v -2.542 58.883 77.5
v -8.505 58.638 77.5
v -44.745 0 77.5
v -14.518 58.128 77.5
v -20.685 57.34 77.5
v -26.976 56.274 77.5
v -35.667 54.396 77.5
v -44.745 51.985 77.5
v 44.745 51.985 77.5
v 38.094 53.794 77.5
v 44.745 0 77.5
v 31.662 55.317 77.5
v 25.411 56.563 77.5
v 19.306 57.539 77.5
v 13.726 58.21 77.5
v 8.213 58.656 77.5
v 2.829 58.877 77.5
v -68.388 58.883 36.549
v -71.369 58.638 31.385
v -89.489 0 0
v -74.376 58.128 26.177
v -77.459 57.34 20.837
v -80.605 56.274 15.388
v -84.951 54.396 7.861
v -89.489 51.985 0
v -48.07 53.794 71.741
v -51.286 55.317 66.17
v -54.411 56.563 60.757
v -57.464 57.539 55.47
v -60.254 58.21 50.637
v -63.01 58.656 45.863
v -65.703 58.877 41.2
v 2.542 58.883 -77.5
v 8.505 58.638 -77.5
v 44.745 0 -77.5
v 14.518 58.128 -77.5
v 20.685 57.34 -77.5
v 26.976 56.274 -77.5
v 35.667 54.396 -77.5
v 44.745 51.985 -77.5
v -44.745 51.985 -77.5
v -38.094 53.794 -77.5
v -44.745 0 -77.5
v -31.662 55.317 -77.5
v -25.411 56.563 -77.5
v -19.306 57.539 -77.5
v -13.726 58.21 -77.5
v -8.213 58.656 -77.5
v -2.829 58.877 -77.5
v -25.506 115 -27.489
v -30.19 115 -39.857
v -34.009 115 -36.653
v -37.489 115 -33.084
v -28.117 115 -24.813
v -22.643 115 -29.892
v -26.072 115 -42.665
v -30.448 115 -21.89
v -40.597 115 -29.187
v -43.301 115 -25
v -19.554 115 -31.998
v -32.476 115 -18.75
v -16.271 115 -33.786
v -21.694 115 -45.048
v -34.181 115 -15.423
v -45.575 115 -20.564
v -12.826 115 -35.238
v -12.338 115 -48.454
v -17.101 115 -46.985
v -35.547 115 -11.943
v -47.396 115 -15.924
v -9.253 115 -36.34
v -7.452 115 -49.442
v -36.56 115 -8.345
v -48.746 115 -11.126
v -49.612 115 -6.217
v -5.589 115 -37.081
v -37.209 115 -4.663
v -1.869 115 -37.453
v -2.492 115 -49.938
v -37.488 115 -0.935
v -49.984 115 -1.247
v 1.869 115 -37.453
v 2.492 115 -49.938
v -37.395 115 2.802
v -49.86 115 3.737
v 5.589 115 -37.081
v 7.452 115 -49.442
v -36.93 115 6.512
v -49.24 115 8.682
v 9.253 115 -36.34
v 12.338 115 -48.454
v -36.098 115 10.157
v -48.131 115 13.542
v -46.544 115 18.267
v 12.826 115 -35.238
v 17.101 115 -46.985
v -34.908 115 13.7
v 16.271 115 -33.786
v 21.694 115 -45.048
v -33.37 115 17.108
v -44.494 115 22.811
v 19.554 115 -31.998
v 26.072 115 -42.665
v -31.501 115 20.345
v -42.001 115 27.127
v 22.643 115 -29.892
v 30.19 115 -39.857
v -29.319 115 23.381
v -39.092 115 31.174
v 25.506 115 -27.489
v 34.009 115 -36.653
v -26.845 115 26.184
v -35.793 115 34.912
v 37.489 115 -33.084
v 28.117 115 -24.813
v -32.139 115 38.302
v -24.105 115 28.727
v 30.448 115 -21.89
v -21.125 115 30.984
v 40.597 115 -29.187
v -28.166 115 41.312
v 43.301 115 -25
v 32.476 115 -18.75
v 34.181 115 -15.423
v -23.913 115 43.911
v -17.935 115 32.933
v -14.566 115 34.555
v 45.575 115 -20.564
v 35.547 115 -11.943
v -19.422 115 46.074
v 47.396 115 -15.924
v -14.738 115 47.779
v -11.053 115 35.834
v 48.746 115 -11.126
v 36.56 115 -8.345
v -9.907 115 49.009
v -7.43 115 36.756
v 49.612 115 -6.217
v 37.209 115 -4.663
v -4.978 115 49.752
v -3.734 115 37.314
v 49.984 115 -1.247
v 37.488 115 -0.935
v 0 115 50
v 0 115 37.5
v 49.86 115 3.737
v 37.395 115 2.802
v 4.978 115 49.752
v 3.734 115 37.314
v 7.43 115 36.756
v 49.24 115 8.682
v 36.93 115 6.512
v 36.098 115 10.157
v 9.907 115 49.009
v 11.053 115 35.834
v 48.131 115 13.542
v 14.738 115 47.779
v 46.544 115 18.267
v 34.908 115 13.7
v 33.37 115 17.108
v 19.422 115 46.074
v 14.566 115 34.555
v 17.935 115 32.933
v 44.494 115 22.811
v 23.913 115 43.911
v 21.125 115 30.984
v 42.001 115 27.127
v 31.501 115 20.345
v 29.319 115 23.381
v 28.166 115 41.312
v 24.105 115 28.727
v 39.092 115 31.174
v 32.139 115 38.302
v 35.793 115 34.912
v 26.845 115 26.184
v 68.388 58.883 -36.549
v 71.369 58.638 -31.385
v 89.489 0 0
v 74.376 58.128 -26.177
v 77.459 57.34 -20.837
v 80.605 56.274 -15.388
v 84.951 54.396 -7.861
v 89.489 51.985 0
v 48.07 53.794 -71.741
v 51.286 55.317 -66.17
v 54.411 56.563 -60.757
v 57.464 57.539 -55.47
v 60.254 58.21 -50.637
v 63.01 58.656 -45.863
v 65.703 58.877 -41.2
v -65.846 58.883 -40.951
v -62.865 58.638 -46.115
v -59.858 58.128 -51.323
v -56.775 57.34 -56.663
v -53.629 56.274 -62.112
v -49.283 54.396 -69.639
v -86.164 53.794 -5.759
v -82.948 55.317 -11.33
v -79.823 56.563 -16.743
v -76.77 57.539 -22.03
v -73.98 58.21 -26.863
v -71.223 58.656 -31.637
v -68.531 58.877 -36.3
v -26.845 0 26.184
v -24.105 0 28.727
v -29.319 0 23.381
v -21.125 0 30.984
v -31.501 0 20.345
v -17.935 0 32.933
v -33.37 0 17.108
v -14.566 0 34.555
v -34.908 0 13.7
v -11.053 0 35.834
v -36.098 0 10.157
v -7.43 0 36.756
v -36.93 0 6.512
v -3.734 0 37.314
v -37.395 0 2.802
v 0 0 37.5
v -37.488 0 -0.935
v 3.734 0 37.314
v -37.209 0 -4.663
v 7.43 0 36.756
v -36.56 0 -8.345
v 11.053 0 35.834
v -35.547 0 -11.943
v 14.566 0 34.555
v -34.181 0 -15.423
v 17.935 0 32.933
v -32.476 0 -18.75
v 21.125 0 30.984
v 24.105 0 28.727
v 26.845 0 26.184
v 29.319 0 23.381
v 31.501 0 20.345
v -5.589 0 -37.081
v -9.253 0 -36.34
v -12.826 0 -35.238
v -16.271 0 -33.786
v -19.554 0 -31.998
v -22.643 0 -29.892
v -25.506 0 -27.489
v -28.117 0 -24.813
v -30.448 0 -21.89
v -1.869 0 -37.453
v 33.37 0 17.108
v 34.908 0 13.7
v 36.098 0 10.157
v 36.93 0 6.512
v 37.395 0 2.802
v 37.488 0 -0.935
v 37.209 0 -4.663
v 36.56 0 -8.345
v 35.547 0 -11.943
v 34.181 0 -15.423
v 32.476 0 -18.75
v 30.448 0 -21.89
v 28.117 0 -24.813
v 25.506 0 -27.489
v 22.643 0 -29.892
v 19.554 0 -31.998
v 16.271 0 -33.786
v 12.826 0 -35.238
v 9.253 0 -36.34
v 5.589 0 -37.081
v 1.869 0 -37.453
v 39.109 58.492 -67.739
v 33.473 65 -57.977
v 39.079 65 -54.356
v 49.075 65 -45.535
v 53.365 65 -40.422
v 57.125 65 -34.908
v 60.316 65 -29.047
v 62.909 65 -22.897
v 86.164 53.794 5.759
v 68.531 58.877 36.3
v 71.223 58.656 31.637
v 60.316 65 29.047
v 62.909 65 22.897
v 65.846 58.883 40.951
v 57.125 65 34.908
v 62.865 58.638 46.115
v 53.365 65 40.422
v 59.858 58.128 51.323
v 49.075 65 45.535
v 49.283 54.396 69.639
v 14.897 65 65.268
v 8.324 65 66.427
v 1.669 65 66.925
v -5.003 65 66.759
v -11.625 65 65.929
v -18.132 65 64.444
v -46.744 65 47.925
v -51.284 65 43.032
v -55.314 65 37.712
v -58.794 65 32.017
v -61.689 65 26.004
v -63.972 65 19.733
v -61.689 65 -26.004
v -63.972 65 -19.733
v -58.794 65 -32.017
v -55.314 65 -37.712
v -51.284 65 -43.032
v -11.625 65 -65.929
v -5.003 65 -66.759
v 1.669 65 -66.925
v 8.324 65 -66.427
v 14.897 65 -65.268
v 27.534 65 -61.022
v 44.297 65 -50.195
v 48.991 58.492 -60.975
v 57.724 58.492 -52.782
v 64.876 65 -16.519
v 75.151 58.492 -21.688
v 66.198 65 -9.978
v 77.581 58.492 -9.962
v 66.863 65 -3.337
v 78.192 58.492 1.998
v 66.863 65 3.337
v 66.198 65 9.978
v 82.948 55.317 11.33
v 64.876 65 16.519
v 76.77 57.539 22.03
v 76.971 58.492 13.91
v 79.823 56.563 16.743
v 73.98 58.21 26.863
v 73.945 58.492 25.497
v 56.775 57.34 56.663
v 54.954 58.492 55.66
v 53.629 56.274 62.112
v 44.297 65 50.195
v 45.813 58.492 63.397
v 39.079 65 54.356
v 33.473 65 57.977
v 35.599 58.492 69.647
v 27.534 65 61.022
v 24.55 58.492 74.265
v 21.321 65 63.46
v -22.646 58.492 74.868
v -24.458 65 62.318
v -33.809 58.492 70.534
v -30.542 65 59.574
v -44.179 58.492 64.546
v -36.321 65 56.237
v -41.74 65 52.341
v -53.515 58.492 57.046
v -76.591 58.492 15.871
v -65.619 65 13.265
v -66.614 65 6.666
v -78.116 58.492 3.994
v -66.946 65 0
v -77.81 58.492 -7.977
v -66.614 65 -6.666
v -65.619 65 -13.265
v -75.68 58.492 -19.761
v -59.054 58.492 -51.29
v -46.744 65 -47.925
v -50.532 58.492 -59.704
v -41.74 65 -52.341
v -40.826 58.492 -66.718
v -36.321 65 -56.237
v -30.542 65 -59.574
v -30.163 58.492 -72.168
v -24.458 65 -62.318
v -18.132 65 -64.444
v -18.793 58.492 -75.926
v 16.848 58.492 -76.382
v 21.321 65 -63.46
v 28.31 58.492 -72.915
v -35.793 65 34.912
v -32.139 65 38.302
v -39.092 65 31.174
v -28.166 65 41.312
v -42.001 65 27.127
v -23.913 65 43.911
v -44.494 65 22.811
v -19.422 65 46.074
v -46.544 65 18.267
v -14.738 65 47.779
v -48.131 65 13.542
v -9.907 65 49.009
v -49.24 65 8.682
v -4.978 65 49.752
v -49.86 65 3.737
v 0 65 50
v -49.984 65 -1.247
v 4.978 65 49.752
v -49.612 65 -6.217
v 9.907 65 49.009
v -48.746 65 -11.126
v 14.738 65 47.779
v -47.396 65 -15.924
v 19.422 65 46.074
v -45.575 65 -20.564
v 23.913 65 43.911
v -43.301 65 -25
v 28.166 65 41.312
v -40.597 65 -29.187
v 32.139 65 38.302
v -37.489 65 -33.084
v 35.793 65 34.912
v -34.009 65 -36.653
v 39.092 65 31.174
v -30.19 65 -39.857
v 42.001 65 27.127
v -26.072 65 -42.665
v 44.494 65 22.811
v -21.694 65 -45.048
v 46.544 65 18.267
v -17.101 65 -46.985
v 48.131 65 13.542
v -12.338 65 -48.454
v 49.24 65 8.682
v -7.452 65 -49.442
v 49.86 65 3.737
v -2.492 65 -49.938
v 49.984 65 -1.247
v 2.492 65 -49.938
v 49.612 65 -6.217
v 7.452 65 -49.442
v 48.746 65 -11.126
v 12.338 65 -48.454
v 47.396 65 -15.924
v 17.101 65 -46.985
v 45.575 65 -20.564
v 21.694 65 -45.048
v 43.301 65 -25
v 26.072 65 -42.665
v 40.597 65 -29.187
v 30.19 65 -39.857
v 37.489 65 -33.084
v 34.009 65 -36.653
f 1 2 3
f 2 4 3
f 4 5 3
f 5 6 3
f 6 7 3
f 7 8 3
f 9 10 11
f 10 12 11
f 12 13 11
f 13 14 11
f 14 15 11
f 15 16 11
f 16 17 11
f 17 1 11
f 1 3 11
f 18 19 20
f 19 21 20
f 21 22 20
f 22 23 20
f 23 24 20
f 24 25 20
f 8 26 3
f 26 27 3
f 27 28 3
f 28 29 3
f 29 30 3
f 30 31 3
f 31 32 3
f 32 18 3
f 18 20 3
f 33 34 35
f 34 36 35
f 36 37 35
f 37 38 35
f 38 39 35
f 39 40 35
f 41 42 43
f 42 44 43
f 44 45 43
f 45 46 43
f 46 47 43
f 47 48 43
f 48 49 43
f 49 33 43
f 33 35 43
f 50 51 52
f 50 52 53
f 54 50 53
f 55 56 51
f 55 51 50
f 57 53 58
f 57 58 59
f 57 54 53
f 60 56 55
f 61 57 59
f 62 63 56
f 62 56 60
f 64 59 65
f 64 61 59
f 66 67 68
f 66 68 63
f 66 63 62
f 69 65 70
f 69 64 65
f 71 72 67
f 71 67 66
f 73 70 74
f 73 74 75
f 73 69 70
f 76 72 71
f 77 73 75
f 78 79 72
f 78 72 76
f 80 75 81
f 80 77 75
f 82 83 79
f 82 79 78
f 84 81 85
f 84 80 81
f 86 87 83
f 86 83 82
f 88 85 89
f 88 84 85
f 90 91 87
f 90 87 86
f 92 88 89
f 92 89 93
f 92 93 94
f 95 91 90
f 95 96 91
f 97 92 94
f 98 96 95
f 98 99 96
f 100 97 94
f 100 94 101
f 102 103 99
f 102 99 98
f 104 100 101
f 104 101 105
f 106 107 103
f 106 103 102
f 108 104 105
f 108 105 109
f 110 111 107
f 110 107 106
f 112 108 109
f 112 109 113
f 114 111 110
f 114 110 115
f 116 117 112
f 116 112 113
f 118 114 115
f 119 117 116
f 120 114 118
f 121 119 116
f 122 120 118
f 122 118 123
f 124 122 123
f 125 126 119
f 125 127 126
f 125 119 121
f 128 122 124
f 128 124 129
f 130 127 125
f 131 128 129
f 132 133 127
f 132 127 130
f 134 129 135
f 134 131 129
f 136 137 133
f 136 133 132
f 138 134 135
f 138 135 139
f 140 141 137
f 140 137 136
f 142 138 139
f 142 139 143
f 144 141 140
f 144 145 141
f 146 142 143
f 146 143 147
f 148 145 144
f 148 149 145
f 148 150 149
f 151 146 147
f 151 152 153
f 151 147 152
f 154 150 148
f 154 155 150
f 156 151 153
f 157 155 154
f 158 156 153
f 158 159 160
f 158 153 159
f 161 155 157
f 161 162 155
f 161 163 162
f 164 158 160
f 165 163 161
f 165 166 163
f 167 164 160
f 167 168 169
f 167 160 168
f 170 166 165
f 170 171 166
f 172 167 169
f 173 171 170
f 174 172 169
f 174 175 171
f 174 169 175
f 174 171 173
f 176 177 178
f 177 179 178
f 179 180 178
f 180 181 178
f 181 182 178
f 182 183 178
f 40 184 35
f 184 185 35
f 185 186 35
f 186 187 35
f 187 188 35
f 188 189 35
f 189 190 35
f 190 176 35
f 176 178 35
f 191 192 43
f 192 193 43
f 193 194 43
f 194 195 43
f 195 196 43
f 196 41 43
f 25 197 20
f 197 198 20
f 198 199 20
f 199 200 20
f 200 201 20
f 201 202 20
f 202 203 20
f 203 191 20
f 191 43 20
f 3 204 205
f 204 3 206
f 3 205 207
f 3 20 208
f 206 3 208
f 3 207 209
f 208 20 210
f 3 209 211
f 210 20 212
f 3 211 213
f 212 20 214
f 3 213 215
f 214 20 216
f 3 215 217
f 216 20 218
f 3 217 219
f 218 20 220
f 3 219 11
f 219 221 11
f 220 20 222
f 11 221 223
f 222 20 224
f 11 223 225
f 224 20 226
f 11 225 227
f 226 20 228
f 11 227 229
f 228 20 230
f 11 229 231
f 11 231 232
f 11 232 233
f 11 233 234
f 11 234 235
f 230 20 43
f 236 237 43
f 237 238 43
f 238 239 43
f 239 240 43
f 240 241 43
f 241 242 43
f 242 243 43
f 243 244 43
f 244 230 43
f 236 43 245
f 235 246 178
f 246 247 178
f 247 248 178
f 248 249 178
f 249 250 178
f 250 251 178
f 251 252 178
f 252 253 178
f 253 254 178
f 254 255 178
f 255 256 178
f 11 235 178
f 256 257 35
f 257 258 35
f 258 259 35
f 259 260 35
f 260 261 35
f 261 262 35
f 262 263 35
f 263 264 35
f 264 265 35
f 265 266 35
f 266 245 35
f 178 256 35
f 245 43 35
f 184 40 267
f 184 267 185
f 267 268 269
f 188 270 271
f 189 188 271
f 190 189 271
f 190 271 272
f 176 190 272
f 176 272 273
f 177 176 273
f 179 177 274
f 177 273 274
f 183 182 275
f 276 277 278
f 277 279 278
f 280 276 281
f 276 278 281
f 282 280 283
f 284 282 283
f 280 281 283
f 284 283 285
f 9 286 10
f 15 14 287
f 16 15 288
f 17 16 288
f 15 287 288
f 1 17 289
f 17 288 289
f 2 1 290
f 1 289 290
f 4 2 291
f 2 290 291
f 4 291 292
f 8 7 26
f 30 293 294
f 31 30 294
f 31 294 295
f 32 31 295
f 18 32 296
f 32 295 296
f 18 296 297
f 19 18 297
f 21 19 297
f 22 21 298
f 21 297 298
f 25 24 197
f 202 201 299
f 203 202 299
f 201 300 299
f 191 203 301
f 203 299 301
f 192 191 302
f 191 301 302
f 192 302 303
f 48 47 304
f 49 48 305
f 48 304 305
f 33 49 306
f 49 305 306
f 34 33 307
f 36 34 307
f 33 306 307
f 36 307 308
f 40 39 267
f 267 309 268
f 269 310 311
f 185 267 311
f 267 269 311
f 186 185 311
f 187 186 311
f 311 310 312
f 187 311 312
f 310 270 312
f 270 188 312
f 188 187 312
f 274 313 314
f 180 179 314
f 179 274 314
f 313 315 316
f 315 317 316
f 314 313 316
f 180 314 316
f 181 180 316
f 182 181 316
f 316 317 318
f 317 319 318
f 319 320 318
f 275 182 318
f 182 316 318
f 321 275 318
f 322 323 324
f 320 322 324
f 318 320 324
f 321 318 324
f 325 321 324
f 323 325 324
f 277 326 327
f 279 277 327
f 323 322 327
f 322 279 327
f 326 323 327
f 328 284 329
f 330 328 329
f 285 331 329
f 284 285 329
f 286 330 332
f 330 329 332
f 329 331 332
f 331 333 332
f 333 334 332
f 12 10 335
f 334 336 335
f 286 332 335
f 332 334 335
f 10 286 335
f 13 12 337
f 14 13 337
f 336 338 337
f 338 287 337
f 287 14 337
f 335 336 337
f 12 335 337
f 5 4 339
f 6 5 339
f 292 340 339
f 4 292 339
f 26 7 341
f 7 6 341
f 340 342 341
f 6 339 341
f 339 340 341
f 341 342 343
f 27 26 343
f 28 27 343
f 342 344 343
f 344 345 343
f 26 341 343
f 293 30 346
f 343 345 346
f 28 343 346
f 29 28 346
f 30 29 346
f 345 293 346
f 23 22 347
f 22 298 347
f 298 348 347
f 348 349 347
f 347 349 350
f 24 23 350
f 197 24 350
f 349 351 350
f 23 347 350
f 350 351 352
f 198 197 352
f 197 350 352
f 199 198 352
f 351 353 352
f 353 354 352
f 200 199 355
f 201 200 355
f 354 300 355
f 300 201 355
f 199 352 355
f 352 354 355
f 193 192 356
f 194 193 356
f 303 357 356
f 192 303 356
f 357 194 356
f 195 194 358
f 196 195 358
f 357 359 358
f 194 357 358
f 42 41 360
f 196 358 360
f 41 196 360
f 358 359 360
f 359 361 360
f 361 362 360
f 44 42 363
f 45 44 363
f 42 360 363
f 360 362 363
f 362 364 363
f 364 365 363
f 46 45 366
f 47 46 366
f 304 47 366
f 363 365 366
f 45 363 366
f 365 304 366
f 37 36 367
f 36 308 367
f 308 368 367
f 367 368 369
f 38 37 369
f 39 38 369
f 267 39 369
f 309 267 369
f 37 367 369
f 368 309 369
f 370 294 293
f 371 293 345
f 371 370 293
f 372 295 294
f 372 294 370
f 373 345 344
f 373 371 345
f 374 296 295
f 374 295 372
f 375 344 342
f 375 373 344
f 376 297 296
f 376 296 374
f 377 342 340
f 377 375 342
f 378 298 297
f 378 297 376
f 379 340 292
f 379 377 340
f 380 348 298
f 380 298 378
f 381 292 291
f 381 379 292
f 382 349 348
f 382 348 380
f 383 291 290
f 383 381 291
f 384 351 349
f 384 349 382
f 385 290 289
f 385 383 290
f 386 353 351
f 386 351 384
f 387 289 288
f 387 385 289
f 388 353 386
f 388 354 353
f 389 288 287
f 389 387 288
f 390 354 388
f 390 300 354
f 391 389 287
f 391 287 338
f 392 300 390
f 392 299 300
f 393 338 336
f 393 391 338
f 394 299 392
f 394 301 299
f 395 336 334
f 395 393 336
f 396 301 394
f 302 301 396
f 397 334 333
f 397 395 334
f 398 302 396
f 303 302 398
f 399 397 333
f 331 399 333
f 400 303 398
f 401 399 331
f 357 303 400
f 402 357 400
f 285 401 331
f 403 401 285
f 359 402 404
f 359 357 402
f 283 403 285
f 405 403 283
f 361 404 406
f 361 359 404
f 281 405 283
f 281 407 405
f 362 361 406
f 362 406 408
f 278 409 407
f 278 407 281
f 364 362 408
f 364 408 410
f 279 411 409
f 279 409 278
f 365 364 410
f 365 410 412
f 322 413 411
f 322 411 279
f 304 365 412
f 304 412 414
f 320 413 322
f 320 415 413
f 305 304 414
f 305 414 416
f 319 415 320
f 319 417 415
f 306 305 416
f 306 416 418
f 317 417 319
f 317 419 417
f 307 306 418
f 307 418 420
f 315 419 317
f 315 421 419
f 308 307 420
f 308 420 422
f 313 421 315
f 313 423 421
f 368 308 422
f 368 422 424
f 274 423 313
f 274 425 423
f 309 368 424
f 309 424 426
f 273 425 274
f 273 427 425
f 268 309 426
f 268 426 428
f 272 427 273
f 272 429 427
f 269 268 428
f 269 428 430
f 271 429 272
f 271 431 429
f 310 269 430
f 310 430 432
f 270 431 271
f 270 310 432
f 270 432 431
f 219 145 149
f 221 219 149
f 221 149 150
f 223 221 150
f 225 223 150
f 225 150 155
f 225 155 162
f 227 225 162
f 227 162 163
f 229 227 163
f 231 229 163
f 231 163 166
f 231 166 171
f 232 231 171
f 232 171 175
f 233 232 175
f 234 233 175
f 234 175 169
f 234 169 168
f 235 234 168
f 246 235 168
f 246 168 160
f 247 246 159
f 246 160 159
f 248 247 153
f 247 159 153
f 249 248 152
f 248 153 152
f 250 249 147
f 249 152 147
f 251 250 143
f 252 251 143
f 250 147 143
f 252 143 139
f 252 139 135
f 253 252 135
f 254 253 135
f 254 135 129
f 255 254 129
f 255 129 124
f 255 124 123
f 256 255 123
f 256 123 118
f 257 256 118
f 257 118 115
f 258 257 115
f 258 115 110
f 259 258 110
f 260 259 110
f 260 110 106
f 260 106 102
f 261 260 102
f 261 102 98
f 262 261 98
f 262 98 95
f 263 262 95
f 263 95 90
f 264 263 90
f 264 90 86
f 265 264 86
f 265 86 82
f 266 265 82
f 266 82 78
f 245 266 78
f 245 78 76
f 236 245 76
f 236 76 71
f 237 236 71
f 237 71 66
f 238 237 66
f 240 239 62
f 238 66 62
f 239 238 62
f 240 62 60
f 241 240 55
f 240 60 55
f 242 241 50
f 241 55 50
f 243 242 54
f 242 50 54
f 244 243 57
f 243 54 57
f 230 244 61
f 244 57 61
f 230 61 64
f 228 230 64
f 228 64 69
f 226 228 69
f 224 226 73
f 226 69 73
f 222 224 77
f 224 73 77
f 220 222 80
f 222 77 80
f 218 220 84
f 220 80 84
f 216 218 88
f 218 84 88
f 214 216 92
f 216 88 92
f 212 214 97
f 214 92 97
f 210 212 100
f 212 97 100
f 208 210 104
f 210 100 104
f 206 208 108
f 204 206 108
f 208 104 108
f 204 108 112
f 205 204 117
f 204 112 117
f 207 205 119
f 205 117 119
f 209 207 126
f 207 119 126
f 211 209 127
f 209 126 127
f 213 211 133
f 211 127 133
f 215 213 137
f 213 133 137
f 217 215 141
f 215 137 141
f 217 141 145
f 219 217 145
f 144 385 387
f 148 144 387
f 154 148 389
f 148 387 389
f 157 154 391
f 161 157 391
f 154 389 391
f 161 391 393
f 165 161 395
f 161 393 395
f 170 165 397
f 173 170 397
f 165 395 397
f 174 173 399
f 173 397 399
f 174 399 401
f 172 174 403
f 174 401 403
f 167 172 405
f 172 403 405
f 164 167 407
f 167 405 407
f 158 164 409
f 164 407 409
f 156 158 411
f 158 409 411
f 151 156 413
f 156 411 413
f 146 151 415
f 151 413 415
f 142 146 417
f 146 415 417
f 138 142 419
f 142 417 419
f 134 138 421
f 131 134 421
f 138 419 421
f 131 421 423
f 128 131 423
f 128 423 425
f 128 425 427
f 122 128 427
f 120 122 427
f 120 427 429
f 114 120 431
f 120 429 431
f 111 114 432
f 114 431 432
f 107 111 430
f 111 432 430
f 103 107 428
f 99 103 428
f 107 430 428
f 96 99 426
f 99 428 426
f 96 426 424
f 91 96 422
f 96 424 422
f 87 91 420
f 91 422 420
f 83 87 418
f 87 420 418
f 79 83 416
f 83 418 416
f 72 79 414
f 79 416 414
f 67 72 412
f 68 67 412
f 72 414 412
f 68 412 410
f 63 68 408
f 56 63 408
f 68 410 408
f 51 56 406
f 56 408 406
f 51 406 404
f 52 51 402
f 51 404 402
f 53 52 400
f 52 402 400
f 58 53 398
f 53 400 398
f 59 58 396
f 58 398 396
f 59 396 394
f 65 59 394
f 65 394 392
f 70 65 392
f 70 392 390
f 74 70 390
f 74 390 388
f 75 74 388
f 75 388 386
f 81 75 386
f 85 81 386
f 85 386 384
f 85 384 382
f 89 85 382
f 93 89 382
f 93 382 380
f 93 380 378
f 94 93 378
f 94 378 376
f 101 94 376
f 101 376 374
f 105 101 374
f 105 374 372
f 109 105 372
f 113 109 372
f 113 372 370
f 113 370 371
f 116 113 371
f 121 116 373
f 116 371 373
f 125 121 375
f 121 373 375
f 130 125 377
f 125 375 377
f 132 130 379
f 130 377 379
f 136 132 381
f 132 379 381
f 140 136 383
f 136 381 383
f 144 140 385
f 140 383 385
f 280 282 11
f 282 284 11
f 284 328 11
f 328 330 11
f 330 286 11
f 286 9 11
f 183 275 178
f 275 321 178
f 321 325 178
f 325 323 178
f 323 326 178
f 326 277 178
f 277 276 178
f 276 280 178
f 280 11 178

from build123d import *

# Parameters (mm, degrees)
BOSS_EXTRUDE1_DEPTH = 65
SKETCH7_R           = 50
BOSS_EXTRUDE2_DEPTH = 50
SKETCH8_R           = 37.5
CUT_EXTRUDE1_DEPTH  = 166.044186003


with BuildPart() as part:
    # Sketch1 → Boss-Extrude1 (new body)
    with BuildSketch(Plane(origin=(0, 0, 0), x_dir=(1, 0, 0), z_dir=(0, 1, 0))):
        Polygon((44.744645862, -77.5), (89.489291724, 0), (44.744645862, 77.5), (-44.744645862, 77.5), (-89.489291724, 0), (-44.744645862, -77.5), align=None)
    extrude(amount=BOSS_EXTRUDE1_DEPTH)

    # Sketch5 → Cut-Revolve1 (revolve, cut)
    with BuildSketch(Plane.XY, mode=Mode.PRIVATE) as cut_revolve1_sk:
        Polygon((66.946176196, 65), (89.489291724, 65), (89.489291724, 51.984726181), align=None)
    revolve(cut_revolve1_sk.sketch.rotate(Axis((0, 80.544335103, 0), (0, -1, 0)), 300.000000001), axis=Axis((0, 80.544335103, 0), (0, -1, 0)), mode=Mode.SUBTRACT)

    # Sketch7 → Boss-Extrude2 (add)
    with BuildSketch(Plane(origin=(0, 65, 0), x_dir=(1, 0, 0), z_dir=(0, 1, 0))):
        with Locations(Location((0, 0, 0), (0, 0, 270))):
            Circle(SKETCH7_R)
    extrude(amount=BOSS_EXTRUDE2_DEPTH)

    # Sketch8 → Cut-Extrude1 (cut, through all)
    with BuildSketch(Plane(origin=(0, 115, 0), x_dir=(1, 0, 0), z_dir=(0, 1, 0))):
        with Locations(Location((0, 0, 0), (0, 0, 270))):
            Circle(SKETCH8_R)
    extrude(amount=-CUT_EXTRUDE1_DEPTH, mode=Mode.SUBTRACT)


solid = part.part
